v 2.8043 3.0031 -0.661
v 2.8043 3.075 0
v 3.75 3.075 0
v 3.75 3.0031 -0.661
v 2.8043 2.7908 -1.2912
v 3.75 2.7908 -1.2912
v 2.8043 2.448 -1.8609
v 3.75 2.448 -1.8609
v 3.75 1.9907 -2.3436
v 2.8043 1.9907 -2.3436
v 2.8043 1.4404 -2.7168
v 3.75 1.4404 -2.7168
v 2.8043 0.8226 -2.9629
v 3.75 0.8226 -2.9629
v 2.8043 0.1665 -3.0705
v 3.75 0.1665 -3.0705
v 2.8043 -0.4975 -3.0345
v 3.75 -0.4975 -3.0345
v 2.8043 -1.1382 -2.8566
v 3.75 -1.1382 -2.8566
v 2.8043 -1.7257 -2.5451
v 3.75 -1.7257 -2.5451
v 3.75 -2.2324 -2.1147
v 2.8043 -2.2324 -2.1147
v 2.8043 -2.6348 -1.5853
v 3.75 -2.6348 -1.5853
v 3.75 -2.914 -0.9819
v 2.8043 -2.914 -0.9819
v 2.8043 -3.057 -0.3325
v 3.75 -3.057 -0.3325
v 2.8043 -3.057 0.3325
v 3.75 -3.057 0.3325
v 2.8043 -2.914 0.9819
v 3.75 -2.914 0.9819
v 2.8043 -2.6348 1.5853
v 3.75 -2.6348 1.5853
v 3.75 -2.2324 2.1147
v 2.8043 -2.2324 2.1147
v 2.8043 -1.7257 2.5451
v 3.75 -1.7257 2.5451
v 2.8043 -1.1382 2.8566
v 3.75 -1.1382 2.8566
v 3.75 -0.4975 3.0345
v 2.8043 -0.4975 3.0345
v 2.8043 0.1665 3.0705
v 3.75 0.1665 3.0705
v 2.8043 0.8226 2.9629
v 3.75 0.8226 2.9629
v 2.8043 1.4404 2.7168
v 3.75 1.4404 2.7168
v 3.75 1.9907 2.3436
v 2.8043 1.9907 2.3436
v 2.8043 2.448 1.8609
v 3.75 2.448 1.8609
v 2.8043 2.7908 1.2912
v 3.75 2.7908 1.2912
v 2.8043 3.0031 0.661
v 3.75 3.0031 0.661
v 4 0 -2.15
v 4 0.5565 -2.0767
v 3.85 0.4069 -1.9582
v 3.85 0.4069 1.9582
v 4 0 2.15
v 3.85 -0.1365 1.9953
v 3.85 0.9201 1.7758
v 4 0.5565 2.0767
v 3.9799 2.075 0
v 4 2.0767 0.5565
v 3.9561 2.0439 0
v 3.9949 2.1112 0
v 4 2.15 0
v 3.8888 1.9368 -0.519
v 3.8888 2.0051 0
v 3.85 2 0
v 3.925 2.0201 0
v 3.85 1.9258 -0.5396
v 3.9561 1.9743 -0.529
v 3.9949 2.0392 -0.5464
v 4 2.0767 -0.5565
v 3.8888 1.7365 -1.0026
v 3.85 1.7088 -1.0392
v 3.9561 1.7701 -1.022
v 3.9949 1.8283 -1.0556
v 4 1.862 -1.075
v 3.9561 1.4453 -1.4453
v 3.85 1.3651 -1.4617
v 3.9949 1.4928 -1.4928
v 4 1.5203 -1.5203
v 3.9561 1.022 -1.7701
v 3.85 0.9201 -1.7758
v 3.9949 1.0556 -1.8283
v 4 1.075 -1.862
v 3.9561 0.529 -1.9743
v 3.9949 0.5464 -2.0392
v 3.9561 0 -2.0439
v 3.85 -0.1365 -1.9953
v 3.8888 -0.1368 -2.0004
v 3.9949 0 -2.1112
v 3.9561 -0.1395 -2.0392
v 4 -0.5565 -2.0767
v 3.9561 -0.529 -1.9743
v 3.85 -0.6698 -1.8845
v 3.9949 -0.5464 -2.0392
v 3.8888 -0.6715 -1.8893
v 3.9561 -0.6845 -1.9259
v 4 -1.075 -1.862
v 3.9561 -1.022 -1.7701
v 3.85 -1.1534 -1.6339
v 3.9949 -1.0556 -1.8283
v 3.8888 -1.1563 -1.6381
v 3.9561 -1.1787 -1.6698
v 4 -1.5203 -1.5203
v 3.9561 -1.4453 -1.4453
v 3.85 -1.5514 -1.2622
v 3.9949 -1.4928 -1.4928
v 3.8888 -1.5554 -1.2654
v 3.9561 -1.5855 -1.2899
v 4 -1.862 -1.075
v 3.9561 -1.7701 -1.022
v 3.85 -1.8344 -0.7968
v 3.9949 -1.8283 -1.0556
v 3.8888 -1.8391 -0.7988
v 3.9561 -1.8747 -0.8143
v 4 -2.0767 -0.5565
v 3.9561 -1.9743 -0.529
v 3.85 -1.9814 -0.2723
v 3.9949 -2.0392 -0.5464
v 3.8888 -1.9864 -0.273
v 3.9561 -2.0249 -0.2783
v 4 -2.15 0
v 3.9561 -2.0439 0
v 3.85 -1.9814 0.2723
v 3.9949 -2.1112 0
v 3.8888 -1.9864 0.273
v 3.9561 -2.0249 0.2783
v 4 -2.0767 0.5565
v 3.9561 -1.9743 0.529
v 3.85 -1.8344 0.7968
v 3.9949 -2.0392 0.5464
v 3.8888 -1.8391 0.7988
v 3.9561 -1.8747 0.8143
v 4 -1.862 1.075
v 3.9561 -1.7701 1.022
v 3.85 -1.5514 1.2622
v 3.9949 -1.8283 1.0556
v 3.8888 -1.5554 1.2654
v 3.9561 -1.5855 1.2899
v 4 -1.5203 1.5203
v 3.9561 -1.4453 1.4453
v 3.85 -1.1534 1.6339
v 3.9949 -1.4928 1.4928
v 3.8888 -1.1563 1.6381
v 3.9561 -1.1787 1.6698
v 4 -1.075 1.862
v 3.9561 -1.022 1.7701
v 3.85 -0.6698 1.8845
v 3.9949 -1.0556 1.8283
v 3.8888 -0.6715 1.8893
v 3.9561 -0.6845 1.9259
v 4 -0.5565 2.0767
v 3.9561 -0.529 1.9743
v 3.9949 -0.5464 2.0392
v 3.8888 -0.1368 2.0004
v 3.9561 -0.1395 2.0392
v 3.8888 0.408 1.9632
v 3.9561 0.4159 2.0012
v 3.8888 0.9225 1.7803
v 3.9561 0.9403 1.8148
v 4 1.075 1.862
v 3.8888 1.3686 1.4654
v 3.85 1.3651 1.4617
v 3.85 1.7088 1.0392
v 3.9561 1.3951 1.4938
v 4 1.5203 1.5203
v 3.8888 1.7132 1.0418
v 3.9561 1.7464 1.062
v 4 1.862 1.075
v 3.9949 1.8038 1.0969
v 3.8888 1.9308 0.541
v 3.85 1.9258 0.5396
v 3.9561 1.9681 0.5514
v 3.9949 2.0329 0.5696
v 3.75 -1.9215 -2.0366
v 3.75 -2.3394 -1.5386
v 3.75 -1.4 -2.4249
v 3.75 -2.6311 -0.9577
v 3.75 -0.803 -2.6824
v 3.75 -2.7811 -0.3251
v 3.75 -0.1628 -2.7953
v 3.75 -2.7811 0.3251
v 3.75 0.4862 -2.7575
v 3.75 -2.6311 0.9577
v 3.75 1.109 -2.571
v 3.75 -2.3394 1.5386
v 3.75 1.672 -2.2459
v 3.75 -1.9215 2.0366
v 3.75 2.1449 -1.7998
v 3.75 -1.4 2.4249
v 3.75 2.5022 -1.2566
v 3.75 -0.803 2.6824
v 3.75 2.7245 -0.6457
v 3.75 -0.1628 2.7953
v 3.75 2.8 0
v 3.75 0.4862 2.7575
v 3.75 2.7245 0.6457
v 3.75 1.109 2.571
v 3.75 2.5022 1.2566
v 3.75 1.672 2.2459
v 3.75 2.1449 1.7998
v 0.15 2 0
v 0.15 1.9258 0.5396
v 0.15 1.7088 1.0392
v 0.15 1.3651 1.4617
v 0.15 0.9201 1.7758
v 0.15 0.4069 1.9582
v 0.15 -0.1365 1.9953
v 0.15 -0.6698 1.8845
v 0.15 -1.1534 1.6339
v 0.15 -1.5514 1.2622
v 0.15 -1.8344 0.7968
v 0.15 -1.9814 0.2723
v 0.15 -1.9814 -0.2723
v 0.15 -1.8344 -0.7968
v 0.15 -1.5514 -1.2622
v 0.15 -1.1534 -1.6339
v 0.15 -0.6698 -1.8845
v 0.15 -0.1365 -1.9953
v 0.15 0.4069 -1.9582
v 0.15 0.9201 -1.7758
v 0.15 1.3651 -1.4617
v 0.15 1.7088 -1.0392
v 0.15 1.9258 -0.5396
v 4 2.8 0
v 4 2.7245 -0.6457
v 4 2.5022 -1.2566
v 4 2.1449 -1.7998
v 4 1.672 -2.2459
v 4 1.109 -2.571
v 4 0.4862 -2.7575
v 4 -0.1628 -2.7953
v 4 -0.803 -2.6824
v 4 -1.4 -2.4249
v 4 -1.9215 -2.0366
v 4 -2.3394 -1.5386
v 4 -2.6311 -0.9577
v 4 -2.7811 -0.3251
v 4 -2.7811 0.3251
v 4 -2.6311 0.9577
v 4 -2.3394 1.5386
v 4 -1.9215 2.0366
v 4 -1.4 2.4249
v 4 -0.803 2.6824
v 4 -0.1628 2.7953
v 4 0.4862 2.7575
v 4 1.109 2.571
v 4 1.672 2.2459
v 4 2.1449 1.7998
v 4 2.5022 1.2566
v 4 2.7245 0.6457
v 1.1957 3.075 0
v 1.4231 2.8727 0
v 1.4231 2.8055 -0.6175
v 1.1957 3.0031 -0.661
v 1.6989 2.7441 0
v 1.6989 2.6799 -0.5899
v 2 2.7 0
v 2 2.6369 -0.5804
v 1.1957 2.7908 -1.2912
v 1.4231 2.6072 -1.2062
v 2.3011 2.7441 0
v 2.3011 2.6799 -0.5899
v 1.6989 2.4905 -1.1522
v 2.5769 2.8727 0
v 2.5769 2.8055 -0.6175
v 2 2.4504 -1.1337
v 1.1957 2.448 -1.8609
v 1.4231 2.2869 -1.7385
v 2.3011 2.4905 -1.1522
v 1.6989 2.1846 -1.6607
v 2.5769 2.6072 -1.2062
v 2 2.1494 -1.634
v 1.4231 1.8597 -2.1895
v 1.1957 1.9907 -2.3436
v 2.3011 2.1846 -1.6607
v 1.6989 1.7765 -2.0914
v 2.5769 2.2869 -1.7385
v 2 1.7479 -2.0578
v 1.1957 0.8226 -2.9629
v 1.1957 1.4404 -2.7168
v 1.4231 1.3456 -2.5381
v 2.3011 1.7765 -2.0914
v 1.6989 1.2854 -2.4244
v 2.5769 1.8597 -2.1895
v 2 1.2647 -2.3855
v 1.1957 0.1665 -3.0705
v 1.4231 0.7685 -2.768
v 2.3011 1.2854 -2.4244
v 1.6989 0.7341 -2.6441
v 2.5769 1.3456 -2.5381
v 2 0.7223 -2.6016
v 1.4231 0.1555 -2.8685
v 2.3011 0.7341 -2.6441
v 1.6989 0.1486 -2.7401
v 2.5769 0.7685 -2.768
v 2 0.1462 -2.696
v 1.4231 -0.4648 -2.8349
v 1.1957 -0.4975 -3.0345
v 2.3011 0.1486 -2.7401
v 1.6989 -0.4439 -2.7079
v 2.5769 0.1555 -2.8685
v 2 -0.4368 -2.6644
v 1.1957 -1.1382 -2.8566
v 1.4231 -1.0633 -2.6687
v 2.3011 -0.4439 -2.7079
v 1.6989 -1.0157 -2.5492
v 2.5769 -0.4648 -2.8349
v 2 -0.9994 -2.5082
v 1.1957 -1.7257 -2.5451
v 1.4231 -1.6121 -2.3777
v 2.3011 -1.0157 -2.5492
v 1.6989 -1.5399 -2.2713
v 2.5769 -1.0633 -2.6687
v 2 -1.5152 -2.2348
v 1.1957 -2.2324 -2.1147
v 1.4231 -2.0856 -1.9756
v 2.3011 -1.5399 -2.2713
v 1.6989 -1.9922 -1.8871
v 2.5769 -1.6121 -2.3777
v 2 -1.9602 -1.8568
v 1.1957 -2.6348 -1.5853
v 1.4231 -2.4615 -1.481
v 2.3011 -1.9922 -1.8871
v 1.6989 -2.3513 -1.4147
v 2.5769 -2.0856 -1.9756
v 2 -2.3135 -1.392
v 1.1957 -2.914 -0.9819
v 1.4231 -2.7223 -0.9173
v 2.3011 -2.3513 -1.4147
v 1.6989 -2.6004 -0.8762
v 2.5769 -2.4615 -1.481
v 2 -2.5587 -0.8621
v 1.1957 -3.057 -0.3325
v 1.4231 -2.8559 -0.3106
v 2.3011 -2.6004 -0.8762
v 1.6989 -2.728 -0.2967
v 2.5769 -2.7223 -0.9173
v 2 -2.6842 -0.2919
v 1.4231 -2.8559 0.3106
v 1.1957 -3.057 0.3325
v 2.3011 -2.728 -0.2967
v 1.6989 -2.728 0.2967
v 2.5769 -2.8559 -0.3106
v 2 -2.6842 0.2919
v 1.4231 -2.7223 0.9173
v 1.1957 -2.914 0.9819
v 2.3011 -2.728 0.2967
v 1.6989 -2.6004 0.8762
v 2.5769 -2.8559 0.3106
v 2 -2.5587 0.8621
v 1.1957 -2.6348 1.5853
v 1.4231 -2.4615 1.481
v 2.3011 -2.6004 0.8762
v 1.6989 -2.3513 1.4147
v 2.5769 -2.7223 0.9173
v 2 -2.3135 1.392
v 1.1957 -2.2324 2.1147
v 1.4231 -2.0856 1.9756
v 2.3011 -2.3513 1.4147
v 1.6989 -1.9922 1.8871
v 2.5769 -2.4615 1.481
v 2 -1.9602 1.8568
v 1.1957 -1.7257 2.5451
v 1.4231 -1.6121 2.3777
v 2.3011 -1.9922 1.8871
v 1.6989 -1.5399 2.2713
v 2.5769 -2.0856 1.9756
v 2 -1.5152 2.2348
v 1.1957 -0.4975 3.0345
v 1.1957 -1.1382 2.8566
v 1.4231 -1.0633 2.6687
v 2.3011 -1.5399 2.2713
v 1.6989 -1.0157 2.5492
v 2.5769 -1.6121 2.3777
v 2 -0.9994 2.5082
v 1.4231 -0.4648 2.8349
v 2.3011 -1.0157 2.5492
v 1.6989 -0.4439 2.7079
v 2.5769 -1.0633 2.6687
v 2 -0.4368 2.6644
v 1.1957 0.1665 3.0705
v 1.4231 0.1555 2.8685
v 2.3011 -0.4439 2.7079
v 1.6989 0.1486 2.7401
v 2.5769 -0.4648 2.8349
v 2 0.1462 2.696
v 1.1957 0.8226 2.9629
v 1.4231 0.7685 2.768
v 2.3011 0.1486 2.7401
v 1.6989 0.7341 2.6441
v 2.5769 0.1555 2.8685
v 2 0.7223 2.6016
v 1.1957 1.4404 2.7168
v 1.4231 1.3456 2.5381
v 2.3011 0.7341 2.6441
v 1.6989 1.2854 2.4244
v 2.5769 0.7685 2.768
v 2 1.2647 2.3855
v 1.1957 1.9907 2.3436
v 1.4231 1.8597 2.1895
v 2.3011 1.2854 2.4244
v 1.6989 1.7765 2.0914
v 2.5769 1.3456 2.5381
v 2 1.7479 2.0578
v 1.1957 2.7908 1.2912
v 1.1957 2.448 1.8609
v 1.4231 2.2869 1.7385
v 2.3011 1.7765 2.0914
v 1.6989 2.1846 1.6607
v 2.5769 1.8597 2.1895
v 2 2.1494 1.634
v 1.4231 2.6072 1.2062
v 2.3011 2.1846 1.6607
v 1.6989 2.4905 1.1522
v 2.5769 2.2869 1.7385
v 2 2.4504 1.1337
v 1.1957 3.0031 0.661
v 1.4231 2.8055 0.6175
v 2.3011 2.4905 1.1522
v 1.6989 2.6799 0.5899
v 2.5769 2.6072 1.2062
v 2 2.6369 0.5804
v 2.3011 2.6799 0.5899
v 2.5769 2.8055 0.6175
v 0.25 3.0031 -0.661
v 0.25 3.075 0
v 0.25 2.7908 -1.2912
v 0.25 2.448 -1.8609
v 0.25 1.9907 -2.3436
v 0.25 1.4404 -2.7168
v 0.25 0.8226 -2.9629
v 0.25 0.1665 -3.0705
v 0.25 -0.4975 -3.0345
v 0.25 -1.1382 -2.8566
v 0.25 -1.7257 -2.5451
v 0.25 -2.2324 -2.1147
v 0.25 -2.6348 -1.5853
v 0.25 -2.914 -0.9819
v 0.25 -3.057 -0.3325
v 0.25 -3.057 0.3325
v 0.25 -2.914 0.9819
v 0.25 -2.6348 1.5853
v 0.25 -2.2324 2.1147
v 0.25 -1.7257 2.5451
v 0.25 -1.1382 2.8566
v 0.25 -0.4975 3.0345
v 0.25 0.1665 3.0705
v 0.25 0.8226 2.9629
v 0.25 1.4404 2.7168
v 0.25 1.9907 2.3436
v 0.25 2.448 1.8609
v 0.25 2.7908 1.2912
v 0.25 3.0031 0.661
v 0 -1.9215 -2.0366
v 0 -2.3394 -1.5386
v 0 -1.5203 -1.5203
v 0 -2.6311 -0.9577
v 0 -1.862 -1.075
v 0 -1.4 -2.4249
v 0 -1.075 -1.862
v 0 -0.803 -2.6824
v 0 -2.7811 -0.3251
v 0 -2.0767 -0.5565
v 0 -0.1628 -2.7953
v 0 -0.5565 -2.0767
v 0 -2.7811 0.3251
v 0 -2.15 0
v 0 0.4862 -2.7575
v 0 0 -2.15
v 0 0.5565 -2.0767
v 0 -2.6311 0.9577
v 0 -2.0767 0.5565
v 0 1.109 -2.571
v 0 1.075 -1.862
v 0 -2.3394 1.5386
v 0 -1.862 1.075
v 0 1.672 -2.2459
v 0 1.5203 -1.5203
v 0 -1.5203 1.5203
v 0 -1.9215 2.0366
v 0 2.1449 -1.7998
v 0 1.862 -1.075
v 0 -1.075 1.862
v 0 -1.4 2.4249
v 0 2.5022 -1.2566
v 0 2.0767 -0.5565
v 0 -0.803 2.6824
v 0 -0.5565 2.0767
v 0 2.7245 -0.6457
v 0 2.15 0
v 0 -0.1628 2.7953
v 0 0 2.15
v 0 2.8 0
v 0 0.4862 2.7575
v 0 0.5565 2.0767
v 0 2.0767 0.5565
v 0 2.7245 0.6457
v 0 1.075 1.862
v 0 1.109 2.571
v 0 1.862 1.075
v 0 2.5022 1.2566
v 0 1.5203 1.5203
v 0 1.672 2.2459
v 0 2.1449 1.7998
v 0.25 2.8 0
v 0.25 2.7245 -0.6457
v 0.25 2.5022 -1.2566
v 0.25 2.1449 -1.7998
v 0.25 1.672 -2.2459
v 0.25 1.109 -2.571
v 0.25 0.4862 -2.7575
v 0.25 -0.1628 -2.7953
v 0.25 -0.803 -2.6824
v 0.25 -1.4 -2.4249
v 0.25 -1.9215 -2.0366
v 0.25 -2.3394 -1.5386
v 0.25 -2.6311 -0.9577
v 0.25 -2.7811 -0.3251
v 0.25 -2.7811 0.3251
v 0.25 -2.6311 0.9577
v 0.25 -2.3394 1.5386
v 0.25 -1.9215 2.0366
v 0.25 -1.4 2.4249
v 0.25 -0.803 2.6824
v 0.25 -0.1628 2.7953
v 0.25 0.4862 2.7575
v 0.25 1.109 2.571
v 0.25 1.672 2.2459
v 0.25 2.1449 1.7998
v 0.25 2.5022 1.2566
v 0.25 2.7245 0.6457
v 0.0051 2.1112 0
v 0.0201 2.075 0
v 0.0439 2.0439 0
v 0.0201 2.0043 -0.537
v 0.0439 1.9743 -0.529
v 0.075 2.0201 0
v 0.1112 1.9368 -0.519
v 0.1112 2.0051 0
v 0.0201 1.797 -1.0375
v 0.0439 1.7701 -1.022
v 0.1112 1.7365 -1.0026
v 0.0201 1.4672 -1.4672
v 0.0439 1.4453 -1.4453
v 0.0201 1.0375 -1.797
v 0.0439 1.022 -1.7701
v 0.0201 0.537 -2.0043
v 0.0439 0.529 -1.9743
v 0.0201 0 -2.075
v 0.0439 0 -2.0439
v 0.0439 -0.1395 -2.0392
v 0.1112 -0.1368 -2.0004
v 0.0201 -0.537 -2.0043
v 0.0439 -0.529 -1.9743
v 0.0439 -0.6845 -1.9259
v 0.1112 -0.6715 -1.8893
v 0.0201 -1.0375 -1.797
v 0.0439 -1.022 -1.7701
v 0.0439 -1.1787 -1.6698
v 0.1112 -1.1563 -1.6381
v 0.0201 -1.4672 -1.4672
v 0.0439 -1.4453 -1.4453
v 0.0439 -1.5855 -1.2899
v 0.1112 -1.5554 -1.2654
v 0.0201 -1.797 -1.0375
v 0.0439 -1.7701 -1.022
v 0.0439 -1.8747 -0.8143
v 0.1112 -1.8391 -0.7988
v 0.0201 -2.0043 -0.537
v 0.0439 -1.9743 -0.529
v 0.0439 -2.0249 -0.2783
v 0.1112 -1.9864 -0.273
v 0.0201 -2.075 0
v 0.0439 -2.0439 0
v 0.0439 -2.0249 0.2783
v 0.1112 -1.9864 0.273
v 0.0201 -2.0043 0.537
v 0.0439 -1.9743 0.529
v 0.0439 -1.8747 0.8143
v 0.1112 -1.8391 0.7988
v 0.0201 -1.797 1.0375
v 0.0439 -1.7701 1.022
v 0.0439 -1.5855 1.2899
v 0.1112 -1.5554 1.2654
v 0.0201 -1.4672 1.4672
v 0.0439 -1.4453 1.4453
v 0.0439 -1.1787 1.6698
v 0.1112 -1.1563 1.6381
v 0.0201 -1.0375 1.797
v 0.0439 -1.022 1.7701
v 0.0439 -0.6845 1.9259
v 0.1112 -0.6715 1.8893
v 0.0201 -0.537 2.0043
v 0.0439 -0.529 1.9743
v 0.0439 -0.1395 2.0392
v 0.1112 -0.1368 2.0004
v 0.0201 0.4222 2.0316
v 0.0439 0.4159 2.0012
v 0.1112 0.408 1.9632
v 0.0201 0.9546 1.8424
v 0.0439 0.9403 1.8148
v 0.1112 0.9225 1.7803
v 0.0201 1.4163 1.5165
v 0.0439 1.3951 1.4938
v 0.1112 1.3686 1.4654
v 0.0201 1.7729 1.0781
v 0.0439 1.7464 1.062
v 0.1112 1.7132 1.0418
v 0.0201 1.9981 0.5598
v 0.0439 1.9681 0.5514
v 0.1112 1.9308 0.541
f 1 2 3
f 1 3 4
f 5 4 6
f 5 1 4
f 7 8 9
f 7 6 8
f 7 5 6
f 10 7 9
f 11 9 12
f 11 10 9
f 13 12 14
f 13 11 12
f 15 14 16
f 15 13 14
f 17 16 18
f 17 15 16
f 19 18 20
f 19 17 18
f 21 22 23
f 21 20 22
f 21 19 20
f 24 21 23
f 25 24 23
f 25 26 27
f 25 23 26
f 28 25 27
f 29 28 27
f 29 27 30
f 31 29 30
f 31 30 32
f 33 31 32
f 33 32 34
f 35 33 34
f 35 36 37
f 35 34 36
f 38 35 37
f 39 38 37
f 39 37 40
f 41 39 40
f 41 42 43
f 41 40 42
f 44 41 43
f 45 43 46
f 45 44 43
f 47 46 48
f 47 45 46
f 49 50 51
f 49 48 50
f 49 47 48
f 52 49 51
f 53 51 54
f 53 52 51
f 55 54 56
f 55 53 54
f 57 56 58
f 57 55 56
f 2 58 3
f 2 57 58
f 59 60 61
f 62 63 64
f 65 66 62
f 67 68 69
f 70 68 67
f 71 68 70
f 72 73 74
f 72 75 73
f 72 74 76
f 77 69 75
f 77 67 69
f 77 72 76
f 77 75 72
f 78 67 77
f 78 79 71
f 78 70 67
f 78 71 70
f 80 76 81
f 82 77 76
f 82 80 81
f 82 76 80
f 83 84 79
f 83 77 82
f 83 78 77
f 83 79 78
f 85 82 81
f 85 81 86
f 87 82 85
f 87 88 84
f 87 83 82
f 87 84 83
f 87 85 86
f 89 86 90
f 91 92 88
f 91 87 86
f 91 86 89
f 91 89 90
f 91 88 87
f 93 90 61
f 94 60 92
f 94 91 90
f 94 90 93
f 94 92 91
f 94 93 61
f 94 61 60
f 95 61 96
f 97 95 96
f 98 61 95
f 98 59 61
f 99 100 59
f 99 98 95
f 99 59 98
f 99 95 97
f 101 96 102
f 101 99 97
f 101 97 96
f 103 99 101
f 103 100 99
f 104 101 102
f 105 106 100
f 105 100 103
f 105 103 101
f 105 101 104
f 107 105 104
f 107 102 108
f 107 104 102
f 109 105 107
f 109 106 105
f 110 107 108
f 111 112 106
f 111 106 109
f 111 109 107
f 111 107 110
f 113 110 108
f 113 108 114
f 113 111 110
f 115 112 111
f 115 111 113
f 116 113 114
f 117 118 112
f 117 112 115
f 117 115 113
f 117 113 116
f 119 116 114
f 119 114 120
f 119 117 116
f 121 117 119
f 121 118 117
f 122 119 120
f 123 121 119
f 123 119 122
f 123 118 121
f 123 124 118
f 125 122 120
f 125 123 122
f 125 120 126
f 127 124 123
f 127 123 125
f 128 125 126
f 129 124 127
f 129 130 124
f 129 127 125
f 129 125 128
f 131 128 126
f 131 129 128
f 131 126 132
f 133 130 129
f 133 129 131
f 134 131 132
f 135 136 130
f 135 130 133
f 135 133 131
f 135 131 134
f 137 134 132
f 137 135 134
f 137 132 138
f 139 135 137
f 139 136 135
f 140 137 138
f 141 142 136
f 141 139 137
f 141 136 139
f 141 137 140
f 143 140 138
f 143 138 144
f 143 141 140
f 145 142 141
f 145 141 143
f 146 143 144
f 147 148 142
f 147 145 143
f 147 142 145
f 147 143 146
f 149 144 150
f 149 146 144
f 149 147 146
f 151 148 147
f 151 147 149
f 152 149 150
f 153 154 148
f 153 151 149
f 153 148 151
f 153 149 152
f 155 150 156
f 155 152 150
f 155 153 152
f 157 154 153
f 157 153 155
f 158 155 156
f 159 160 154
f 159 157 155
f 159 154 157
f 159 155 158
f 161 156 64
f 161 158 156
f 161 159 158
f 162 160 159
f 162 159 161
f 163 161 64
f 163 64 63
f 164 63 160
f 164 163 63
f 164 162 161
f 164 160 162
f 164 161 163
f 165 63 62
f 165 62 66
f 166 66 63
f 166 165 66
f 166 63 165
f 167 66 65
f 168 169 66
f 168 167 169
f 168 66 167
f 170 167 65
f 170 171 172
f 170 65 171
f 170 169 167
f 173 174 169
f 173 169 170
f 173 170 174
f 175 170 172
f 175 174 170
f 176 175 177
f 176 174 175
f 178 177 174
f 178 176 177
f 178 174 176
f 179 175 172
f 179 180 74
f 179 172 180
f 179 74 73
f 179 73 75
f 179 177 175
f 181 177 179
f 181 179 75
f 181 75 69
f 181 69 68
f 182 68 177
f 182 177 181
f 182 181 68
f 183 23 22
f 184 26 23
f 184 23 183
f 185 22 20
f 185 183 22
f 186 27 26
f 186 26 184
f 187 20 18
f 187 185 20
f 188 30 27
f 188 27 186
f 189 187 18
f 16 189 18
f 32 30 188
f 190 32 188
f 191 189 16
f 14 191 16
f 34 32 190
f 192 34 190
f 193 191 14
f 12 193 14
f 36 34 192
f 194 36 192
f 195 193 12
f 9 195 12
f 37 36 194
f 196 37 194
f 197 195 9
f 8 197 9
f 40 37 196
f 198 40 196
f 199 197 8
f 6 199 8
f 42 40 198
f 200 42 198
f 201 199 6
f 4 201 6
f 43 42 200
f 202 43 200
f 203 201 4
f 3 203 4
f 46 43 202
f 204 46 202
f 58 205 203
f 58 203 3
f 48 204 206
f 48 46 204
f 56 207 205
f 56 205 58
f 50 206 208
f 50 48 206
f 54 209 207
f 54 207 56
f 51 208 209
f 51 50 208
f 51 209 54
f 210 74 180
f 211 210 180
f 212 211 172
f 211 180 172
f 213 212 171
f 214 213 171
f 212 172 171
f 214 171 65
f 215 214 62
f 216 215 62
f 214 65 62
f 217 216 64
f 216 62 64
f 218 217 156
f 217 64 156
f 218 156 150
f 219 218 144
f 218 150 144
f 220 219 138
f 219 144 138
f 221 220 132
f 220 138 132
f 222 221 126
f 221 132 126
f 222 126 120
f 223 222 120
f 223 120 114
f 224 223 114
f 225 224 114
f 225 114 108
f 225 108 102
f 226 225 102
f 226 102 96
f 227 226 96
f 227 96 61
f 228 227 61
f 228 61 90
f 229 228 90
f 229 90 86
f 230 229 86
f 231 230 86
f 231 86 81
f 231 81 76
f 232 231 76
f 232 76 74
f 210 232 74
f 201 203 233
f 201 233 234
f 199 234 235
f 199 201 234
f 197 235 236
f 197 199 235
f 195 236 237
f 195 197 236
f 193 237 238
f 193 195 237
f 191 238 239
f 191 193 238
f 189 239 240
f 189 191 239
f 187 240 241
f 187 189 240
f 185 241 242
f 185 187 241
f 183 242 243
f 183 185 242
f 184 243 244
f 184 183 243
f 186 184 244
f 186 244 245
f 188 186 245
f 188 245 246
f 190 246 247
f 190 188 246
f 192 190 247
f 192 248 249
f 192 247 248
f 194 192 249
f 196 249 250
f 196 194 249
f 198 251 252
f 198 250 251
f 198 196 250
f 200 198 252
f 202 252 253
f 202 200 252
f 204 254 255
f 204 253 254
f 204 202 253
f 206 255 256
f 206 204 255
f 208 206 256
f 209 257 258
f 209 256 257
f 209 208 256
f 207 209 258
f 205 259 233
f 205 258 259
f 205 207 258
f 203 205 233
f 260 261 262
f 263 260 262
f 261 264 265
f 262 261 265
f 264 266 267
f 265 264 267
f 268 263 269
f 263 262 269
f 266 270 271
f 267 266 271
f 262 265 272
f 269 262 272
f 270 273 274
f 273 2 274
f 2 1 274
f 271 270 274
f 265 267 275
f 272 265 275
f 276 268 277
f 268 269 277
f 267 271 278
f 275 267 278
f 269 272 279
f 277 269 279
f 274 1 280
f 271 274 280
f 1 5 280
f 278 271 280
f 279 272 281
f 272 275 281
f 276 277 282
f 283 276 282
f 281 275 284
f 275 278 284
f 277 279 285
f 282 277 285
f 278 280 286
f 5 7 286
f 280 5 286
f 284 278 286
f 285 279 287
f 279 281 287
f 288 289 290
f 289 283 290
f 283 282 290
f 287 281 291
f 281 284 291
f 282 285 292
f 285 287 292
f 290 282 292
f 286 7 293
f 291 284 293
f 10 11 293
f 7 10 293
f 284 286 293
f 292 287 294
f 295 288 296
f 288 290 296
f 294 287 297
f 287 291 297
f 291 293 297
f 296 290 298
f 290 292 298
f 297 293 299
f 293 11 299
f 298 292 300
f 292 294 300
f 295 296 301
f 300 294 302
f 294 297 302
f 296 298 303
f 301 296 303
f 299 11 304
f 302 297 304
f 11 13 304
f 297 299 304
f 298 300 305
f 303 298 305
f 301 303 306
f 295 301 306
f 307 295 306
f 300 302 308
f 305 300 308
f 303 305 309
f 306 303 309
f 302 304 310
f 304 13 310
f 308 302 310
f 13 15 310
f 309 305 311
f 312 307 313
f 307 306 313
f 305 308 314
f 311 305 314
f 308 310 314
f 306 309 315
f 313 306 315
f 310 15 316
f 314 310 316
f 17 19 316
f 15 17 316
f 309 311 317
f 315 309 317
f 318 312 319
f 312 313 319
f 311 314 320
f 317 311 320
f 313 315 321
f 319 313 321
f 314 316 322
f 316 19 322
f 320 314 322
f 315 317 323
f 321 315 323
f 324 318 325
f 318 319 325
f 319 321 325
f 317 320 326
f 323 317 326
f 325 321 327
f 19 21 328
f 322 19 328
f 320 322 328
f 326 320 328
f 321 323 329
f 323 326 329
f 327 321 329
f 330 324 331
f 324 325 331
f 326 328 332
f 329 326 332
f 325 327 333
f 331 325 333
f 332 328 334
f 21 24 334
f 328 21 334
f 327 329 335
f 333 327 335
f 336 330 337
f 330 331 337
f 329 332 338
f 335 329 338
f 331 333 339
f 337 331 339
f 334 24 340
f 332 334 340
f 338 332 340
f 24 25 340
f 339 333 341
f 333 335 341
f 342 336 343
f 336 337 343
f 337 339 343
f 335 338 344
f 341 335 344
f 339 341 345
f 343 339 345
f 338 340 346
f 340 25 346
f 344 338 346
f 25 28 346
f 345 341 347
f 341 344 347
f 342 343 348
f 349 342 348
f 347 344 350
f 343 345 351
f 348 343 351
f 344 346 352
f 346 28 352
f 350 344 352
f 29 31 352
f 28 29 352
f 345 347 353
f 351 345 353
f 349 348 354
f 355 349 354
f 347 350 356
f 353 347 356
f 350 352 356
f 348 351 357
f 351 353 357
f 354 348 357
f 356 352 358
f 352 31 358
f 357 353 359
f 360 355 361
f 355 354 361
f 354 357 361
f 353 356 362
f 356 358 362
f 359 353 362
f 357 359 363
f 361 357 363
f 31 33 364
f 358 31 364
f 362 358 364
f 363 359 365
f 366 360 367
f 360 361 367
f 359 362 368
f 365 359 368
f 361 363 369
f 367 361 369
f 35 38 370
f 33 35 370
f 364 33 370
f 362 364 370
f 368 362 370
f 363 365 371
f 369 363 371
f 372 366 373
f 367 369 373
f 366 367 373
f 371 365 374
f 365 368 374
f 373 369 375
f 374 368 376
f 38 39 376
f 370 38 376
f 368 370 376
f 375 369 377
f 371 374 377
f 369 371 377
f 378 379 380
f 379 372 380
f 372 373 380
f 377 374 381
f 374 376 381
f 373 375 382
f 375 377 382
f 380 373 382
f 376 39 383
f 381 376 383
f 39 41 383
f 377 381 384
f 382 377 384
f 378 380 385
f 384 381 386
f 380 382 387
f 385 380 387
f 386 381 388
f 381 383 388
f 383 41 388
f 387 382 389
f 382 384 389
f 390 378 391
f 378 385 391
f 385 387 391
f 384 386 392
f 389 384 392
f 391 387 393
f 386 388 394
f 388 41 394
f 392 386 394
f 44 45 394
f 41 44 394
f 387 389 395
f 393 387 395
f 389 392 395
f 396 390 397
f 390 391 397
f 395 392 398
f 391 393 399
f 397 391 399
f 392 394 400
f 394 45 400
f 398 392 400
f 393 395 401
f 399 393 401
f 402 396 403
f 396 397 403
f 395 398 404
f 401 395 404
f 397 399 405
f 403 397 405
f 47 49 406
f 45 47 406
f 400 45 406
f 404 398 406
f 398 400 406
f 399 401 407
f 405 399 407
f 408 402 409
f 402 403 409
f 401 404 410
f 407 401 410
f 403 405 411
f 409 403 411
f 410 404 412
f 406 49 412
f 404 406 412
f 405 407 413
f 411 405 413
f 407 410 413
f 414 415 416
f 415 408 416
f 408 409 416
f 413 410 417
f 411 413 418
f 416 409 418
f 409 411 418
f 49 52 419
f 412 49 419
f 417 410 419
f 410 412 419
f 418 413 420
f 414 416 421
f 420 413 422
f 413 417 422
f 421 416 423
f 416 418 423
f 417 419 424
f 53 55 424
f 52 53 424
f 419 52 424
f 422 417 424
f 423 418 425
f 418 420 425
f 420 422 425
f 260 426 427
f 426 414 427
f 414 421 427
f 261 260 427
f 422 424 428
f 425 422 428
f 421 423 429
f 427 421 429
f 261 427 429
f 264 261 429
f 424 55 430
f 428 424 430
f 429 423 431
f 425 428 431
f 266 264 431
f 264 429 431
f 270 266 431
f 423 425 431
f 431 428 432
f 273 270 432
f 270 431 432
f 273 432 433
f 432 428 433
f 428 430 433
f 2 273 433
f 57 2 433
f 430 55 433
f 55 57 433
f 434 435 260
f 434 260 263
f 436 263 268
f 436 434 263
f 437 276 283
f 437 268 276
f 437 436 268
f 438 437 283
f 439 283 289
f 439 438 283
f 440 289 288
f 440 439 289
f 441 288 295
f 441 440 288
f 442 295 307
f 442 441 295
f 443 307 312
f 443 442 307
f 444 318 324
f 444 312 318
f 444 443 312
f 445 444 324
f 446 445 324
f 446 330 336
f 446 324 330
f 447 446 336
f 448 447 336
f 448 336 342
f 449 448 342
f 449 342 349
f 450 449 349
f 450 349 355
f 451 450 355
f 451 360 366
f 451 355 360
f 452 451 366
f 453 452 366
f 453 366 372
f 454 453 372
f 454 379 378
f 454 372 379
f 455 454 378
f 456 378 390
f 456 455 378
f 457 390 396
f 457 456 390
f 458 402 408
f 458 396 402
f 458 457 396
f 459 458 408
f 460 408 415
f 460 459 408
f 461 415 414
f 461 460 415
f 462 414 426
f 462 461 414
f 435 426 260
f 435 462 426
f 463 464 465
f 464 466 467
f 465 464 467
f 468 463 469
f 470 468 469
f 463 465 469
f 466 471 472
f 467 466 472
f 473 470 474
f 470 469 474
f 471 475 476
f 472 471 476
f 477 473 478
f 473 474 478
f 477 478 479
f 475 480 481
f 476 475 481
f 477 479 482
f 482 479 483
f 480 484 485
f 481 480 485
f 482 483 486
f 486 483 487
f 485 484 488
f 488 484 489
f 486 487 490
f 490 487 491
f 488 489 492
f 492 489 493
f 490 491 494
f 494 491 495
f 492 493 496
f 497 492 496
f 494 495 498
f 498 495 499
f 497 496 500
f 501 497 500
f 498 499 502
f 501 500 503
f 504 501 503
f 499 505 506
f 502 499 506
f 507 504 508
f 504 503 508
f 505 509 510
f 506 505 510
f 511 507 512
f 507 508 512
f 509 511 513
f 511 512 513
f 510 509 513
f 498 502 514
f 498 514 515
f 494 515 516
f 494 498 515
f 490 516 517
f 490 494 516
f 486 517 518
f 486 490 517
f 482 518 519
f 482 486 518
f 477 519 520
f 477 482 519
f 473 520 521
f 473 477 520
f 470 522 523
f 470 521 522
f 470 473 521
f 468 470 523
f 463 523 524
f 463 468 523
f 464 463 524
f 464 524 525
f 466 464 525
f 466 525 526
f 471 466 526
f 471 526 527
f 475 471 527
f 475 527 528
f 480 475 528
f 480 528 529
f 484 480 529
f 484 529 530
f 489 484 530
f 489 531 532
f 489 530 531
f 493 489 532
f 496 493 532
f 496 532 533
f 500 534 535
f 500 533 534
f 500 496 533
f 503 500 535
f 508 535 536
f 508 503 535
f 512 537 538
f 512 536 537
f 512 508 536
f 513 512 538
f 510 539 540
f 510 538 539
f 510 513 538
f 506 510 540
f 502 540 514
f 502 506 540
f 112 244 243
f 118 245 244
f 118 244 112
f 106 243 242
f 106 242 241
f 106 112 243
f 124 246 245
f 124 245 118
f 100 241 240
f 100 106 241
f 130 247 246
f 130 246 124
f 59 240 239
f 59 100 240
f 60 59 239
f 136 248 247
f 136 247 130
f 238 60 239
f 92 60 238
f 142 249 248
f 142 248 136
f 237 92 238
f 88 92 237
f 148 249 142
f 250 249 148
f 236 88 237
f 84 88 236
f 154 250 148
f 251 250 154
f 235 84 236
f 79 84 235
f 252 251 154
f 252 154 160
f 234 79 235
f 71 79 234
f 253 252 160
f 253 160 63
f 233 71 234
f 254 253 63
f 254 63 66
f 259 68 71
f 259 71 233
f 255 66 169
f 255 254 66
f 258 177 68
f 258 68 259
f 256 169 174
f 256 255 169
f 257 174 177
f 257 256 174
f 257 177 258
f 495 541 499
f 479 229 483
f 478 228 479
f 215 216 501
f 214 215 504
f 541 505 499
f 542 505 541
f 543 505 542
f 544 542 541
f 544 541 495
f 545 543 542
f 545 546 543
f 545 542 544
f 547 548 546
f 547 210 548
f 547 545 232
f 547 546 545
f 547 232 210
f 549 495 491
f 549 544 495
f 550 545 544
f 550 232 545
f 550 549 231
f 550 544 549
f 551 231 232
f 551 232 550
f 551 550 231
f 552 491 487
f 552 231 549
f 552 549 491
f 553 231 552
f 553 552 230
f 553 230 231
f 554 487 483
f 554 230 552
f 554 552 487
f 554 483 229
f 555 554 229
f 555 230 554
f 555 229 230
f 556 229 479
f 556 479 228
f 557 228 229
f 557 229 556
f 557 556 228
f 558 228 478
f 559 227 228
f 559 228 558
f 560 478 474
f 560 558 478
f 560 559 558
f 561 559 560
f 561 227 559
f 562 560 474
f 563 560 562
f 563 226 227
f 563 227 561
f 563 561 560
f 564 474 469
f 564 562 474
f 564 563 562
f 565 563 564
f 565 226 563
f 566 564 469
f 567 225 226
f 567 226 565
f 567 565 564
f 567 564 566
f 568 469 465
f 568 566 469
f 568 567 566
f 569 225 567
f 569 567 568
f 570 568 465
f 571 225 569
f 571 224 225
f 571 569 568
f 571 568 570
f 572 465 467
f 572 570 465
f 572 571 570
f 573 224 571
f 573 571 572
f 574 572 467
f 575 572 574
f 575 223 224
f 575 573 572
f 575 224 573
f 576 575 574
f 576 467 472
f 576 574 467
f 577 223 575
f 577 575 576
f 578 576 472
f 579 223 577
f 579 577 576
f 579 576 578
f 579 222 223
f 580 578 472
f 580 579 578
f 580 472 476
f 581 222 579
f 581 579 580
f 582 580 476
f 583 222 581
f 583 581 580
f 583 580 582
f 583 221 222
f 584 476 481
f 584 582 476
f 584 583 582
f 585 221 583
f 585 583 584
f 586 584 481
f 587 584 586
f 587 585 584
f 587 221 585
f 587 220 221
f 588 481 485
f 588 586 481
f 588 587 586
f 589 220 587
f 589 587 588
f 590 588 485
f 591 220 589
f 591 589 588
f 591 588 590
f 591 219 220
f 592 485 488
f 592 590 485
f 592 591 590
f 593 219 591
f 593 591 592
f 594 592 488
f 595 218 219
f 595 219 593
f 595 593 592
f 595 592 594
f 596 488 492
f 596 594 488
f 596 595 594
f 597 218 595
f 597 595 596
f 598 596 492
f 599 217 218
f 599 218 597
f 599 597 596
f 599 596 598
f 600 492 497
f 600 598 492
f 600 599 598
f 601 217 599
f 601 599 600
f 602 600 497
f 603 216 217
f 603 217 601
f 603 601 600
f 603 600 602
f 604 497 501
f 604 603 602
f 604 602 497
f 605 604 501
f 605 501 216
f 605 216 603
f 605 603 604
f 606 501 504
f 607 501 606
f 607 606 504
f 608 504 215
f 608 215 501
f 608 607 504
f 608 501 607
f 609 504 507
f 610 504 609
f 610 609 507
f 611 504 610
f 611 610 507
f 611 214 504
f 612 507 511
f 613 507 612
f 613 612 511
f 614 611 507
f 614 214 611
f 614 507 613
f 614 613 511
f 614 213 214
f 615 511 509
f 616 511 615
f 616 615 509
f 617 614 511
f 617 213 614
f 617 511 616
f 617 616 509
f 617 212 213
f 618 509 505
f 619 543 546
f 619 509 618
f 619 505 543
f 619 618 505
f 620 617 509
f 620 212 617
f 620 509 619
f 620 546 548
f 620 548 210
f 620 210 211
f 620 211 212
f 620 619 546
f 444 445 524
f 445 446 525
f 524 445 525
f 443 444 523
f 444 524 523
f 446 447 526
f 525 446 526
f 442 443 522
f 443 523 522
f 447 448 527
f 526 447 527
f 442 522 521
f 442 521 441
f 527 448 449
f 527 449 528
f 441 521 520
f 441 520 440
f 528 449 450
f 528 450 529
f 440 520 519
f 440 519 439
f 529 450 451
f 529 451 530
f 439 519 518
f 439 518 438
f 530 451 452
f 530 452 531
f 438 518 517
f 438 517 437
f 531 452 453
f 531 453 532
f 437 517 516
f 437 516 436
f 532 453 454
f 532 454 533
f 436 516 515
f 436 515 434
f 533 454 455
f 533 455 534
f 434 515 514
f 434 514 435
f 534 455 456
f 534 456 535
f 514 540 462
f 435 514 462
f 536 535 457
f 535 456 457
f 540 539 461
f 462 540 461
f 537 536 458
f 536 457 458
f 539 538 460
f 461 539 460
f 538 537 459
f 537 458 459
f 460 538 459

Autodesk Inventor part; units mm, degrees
sketch "Sketch_2" plane through (0, 0, 0) normal (0, 0, 1) x (1, 0, 0)
  line L0 (4, 0) -> (0, 0)
  arc A0 (0, 2.15) -> (0.15, 2) centre (0.15, 2.15) ccw
  line L1 (0.15, 2) -> (3.85, 2)
  arc A1 (3.85, 2) -> (4, 2.15) centre (3.85, 2.15) ccw
  line L2 (4, 2.15) -> (4, 2.8)
  line L3 (4, 2.8) -> (3.75, 2.8)
  line L4 (3.75, 2.8) -> (3.75, 3.075)
  line L5 (3.75, 3.075) -> (2.8043, 3.075)
  arc A2 (1.1957, 3.075) -> (2.8043, 3.075) centre (2, 3.75) ccw
  line L6 (1.1957, 3.075) -> (0.25, 3.075)
  line L7 (0.25, 3.075) -> (0.25, 2.8)
  line L8 (0.25, 2.8) -> (0, 2.8)
  line L9 (0, 2.8) -> (0, 2.15)
revolve "Revolution1" add sketch "Sketch_2" angle 360 about axis through (4, 0, 0) along (1, 0, 0)
ref_plane "ip_st_1_1_XY" through (2, 3.75, 0) normal (1, 0, 0) x (0, 0, -1)
ref_plane "ip_st_1_1_YZ" through (2, 3.75, 0) normal (0, 0, -1) x (0, 1, 0)
ref_plane "ip_st_1_1_ZX" through (2, 3.75, 0) normal (0, 1, 0) x (1, 0, 0)
ref_plane "ip_st_1_2_XY" through (2, 2.6517, 2.6517) normal (1, 0, 0) x (0, 0, -1)
ref_plane "ip_st_1_2_YZ" through (2, 2.6517, 2.6517) normal (0, 0, -1) x (0, 1, 0)
ref_plane "ip_st_1_2_ZX" through (2, 2.6517, 2.6517) normal (0, 1, 0) x (1, 0, 0)
ref_plane "ip_st_1_3_XY" through (2, 0, 3.75) normal (1, 0, 0) x (0, 0, -1)
ref_plane "ip_st_1_3_YZ" through (2, 0, 3.75) normal (0, 0, -1) x (0, 1, 0)
ref_plane "ip_st_1_3_ZX" through (2, 0, 3.75) normal (0, 1, 0) x (1, 0, 0)
ref_plane "ip_st_1_4_XY" through (2, -2.6517, 2.6517) normal (1, 0, 0) x (0, 0, -1)
ref_plane "ip_st_1_4_YZ" through (2, -2.6517, 2.6517) normal (0, 0, -1) x (0, 1, 0)
ref_plane "ip_st_1_4_ZX" through (2, -2.6517, 2.6517) normal (0, 1, 0) x (1, 0, 0)
ref_plane "ip_st_1_5_XY" through (2, -3.75, 0) normal (1, 0, 0) x (0, 0, -1)
ref_plane "ip_st_1_5_YZ" through (2, -3.75, 0) normal (0, 0, -1) x (0, 1, 0)
ref_plane "ip_st_1_5_ZX" through (2, -3.75, 0) normal (0, 1, 0) x (1, 0, 0)
ref_plane "ip_st_1_6_XY" through (2, -2.6517, -2.6517) normal (1, 0, 0) x (0, 0, -1)
ref_plane "ip_st_1_6_YZ" through (2, -2.6517, -2.6517) normal (0, 0, -1) x (0, 1, 0)
ref_plane "ip_st_1_6_ZX" through (2, -2.6517, -2.6517) normal (0, 1, 0) x (1, 0, 0)
ref_plane "ip_st_1_7_XY" through (2, 0, -3.75) normal (1, 0, 0) x (0, 0, -1)
ref_plane "ip_st_1_7_YZ" through (2, 0, -3.75) normal (0, 0, -1) x (0, 1, 0)
ref_plane "ip_st_1_7_ZX" through (2, 0, -3.75) normal (0, 1, 0) x (1, 0, 0)
ref_plane "ip_st_1_8_XY" through (2, 2.6517, -2.6517) normal (1, 0, 0) x (0, 0, -1)
ref_plane "ip_st_1_8_YZ" through (2, 2.6517, -2.6517) normal (0, 0, -1) x (0, 1, 0)
ref_plane "ip_st_1_8_ZX" through (2, 2.6517, -2.6517) normal (0, 1, 0) x (1, 0, 0)
ref_plane "ip_st_1a_XY" through (0, 0, 0) normal (1, 0, 0) x (0, 0, -1)
ref_plane "ip_st_1a_YZ" through (0, 0, 0) normal (0, 0, -1) x (0, 1, 0)
ref_plane "ip_st_1a_ZX" through (0, 0, 0) normal (0, 1, 0) x (1, 0, 0)
ref_plane "ip_st_2a_XY" through (0.25, 0, 0) normal (1, 0, 0) x (0, 0, -1)
ref_plane "ip_st_2a_YZ" through (0.25, 0, 0) normal (0, 0, -1) x (0, 1, 0)
ref_plane "ip_st_2a_ZX" through (0.25, 0, 0) normal (0, 1, 0) x (1, 0, 0)
properties part number "F694ZZ Inner Ring" material "ステンレス鋼 440C"
